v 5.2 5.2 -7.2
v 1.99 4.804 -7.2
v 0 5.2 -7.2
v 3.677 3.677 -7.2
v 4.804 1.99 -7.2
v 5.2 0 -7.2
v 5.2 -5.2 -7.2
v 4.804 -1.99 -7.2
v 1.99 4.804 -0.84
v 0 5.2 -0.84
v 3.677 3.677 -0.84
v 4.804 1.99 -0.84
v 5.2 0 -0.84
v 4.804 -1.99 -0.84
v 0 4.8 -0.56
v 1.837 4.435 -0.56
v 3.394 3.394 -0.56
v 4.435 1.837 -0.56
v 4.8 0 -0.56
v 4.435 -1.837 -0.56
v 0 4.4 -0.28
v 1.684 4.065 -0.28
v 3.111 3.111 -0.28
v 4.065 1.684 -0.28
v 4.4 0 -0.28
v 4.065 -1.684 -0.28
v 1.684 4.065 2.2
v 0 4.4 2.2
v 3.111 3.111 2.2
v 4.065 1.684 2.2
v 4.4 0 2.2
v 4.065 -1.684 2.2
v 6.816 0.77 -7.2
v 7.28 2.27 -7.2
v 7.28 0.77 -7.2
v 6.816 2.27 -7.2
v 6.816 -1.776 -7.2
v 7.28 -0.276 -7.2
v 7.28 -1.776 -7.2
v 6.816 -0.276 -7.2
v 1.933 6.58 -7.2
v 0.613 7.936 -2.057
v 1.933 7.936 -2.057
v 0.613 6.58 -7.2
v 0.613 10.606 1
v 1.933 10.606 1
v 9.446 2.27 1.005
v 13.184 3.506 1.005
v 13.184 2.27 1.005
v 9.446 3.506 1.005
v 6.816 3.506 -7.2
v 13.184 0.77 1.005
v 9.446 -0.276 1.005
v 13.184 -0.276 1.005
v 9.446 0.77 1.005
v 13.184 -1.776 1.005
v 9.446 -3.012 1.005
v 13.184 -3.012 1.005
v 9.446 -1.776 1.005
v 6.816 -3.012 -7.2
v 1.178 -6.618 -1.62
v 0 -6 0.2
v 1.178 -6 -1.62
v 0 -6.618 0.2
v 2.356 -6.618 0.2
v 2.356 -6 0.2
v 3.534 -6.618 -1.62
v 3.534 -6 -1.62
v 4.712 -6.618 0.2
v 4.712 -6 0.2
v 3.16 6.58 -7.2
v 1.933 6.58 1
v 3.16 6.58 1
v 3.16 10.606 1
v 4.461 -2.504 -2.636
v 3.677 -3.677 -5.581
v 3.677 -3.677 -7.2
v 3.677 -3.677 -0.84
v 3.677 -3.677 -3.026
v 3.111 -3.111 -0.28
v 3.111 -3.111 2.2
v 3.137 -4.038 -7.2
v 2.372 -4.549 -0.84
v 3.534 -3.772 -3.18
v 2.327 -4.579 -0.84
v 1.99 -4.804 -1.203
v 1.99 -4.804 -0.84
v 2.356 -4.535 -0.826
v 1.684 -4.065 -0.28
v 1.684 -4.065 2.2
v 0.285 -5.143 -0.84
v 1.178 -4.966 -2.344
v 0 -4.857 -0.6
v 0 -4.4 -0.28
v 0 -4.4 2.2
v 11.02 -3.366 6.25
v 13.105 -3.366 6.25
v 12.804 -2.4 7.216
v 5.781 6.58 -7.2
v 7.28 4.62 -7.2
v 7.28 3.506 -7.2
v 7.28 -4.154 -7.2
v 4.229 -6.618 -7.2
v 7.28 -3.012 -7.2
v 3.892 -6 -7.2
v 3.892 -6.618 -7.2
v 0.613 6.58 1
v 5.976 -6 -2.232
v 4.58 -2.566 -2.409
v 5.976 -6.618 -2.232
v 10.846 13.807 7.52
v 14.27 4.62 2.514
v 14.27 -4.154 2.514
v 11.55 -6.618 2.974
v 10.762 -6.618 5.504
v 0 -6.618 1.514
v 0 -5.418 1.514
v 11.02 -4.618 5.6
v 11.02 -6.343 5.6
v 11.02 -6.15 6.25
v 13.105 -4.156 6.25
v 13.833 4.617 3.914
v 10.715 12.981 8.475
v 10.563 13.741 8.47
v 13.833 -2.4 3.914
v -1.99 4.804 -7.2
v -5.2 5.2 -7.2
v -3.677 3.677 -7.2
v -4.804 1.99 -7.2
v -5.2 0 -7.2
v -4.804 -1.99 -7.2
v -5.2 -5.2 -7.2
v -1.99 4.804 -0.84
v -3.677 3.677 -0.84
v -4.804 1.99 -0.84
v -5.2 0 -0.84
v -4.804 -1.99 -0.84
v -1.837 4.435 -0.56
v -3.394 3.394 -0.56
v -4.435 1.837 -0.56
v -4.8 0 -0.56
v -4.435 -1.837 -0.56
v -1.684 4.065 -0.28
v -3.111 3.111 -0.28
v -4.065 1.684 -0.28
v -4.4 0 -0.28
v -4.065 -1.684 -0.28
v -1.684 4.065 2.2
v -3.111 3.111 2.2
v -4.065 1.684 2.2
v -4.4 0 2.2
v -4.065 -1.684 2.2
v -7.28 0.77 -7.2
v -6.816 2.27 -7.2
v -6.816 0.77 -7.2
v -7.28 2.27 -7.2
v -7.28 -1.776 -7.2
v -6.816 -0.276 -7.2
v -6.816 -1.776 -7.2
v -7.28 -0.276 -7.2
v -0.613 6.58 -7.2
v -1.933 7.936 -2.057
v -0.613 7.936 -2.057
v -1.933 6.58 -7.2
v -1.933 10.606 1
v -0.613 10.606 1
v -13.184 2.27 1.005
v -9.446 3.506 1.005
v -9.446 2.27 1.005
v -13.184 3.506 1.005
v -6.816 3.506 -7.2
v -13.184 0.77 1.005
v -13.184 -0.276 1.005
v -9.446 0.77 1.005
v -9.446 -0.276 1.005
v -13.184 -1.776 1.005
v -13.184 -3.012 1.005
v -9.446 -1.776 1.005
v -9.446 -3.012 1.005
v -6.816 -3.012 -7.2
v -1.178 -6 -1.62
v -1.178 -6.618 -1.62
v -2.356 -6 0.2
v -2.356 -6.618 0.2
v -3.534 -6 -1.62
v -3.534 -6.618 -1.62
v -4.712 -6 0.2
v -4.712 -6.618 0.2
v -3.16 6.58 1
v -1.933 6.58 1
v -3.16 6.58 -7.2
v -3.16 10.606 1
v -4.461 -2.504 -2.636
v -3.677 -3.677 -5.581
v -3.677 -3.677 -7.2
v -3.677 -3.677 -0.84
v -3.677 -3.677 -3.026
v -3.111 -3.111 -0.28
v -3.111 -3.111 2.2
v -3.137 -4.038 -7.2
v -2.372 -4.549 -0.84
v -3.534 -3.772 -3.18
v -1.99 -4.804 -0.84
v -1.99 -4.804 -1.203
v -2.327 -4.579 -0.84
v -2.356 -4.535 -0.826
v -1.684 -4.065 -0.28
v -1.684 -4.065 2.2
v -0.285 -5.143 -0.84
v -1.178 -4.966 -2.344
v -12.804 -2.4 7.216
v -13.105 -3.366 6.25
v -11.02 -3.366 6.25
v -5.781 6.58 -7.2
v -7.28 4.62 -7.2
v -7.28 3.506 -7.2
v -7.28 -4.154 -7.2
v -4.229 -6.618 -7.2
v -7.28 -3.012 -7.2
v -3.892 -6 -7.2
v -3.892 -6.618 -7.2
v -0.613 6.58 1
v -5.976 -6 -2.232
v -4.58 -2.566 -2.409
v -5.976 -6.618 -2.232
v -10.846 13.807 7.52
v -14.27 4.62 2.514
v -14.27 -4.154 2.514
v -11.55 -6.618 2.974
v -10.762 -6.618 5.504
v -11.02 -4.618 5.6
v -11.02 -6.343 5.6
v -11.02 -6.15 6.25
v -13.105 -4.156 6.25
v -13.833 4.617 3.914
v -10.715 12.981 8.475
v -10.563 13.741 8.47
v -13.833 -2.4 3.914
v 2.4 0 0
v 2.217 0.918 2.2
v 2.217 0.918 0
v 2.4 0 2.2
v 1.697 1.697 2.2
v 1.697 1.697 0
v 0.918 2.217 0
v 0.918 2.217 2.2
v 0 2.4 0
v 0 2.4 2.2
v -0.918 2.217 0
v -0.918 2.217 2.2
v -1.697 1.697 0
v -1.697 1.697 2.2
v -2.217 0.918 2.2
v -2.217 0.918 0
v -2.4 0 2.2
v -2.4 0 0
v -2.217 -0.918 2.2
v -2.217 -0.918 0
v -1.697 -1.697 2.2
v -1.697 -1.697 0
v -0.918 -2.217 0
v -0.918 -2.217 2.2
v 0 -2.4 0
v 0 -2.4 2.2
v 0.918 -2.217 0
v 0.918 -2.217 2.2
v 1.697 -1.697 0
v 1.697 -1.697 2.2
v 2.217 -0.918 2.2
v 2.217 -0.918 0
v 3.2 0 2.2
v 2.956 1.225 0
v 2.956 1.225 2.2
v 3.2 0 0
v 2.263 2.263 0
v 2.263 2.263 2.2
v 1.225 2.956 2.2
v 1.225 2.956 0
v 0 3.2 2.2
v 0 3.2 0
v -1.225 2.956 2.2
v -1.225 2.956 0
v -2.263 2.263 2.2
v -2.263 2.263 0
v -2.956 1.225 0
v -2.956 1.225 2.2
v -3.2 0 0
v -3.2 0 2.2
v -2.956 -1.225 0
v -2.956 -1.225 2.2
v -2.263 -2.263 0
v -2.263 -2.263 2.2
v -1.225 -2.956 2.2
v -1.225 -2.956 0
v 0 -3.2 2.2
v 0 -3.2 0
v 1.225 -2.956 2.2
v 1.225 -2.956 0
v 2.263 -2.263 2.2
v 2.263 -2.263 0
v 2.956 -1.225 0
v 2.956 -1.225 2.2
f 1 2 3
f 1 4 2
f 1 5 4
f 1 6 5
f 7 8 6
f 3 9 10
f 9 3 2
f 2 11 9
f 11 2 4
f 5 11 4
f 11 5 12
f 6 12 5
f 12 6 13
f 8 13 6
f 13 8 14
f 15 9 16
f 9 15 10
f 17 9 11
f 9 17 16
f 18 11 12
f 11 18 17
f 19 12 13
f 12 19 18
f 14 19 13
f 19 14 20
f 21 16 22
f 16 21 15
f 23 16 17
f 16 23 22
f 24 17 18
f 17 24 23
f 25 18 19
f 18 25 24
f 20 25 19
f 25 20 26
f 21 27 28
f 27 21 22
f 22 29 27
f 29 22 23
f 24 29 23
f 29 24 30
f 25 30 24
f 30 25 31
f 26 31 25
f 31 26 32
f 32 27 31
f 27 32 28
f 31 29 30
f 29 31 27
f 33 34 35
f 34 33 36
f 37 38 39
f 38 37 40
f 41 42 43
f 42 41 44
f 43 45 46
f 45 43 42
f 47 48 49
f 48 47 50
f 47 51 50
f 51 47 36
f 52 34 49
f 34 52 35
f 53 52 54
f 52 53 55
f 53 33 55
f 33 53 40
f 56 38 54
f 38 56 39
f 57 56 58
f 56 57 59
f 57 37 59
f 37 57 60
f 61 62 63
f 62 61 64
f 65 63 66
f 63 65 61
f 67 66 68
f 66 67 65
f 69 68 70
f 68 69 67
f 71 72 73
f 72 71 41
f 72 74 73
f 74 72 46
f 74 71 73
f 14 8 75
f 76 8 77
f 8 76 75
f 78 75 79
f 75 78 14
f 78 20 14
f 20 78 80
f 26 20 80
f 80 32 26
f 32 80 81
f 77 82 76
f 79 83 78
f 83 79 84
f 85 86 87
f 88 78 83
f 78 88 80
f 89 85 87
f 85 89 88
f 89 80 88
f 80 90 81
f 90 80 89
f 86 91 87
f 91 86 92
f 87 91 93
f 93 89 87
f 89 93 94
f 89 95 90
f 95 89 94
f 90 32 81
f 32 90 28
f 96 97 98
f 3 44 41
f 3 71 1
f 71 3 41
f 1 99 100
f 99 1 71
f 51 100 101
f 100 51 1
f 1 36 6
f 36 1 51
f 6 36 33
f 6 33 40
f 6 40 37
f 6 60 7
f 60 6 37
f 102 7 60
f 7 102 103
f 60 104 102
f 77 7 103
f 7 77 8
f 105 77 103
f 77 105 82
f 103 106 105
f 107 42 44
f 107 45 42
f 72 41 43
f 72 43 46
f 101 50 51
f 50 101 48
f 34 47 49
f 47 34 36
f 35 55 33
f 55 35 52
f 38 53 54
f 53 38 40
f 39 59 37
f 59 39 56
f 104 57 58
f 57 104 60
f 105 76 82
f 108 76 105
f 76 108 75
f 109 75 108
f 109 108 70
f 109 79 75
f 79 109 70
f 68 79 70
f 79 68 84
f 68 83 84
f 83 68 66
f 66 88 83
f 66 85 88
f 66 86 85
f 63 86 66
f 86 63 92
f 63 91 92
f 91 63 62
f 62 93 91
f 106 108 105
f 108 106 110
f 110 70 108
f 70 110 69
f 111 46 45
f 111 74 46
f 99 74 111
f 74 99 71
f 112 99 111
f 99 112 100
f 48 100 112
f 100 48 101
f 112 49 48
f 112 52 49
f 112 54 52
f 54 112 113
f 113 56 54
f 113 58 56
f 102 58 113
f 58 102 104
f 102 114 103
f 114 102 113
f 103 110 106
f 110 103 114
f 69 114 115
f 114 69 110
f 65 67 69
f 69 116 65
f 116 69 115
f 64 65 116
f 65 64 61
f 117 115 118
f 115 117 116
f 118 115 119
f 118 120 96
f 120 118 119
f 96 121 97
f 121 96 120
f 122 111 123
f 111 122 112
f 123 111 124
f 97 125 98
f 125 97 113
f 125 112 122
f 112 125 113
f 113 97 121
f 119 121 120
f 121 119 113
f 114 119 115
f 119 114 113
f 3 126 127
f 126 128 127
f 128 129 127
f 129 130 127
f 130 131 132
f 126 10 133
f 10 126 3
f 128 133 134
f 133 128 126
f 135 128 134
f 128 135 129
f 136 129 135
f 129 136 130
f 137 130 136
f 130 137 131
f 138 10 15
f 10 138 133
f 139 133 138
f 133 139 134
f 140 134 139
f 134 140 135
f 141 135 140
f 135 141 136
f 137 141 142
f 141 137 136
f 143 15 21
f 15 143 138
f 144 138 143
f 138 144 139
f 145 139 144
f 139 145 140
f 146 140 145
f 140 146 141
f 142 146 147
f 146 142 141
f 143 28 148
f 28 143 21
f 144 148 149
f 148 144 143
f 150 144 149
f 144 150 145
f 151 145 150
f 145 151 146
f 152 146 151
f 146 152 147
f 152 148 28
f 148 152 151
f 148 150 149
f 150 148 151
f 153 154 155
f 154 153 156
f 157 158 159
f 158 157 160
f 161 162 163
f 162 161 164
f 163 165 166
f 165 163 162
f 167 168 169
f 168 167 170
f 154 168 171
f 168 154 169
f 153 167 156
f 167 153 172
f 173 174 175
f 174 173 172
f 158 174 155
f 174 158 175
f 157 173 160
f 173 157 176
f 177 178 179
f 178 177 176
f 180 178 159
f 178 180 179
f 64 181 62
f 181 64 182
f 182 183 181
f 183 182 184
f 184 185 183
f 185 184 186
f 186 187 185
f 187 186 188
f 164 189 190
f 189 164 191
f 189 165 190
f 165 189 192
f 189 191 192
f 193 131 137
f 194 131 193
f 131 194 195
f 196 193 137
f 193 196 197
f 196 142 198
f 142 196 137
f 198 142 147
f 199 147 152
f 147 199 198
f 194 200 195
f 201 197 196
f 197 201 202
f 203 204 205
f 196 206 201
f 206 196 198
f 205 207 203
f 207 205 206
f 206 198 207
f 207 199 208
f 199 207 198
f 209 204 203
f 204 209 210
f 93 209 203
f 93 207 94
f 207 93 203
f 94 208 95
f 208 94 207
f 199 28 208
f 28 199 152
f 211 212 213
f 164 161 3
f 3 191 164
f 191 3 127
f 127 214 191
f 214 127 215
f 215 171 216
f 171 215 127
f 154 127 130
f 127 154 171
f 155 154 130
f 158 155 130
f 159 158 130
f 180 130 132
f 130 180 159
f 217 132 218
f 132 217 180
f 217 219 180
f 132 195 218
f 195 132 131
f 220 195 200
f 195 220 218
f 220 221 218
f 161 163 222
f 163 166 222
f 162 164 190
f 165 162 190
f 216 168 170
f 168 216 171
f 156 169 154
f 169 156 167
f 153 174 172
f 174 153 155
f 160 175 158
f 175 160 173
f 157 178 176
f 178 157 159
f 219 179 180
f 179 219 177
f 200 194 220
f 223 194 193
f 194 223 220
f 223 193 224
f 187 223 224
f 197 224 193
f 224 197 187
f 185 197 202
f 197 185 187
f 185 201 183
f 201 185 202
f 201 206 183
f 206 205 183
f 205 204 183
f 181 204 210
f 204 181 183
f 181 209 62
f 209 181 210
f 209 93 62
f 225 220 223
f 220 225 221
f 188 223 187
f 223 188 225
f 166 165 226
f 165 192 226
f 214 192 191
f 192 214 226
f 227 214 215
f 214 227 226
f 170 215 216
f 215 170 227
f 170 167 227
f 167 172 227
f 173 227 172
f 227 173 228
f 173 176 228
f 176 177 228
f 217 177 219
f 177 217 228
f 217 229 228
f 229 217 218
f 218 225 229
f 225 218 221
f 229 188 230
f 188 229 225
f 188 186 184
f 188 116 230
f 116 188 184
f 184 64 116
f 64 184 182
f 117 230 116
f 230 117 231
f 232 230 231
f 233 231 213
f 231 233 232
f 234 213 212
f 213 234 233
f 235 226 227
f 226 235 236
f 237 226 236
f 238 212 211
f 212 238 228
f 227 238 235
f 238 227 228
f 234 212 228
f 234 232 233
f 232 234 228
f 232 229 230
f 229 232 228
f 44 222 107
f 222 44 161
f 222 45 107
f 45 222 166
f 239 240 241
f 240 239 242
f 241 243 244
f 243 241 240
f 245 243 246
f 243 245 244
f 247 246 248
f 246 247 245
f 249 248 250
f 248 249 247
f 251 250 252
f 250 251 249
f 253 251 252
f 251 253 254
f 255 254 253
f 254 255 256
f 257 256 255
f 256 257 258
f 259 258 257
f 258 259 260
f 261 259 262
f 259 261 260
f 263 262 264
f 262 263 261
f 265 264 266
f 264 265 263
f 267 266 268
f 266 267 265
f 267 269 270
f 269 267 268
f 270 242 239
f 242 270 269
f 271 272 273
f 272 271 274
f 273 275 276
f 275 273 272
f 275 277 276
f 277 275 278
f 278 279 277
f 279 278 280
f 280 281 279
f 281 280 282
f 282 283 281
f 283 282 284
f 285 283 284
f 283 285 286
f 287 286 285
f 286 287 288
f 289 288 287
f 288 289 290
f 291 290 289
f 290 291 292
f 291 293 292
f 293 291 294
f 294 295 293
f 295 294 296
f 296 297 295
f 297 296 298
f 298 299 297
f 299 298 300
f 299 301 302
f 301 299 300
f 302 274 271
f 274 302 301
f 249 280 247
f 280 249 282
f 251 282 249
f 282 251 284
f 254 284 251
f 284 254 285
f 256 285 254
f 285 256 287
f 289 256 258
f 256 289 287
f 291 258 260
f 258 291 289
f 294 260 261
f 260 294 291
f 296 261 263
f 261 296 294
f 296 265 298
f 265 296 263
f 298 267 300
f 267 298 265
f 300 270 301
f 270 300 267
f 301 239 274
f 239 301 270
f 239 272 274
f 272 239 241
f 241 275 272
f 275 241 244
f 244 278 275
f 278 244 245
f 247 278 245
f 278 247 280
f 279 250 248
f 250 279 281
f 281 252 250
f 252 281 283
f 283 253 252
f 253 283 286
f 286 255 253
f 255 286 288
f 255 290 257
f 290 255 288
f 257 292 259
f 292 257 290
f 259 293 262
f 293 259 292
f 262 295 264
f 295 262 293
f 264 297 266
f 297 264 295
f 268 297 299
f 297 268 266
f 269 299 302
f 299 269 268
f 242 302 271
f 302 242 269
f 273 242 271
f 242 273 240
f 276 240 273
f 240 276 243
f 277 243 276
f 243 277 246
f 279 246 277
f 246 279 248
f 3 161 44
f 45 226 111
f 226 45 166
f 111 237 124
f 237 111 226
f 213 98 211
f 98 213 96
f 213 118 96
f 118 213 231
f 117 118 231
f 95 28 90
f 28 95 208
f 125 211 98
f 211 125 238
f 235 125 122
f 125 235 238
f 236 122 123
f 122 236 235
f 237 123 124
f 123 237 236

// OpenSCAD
use <../lib.scad>
use <../p/box2-5.scad>
use <s/16095s01.scad>
use <../p/stud4.scad>
function ldraw_lib__16095() = [
// 0 ~Minifig Helmet Large Square - Bottom
// 0 Name: 16095.dat
// 0 Author: Massimo Maso [Sirio]
// 0 !LDRAW_ORG Part UPDATE 2024-03
// 0 !LICENSE Licensed under CC BY 4.0 : see CAreadme.txt
// 
// 0 BFC CERTIFY CCW
  [0,"BFC","CERTIFY"],
  [0,"BFC","CCW"],
// 
// 0 !CATEGORY Minifig Headwear
// 
// 0 !HISTORY 2023-12-08 [MagFors] Split into two parts
// 0 !HISTORY 2024-04-28 [OrionP] Official Update 2024-03
// 
// 0 // Subparts
// 1 16 0 0 0 1 0 0 0 1 0 0 0 1 s\16095s01.dat
  [1,16,0,0,0,1,0,0,0,1,0,0,0,1, ldraw_lib__s__16095s01()],
// 1 16 0 0 0 -1 0 0 0 1 0 0 0 1 s\16095s01.dat
  [1,16,0,0,0,-1,0,0,0,1,0,0,0,1, ldraw_lib__s__16095s01()],
// 0 // Primitives
// 0 BFC INVERTNEXT
  [0,"BFC","INVERTNEXT"],
// 1 16 0 7.75 21.48225 1.5335 0 0 0 0 -10.25 0 -5.03225 0 box2-5.dat
  [1,16,0,7.75,21.48225,1.5335,0,0,0,0,-10.25,0,-5.03225,0, ldraw_lib__box2_5()],
// 1 16 0 -5.5 0 1 0 0 0 -1.375 0 0 0 1 stud4.dat
  [1,16,0,-5.5,0,1,0,0,0,-1.375,0,0,0,1, ldraw_lib__stud4()],
// 0 // Faces
// 3 16 0 18 13 -1.5335 18 16.45 1.5335 18 16.45
  [3,16,0,18,13,-1.5335,18,16.45,1.5335,18,16.45],
// 4 16 -27.116 -18.8 34.517 27.116 -18.8 34.517 1.5335 -2.5 26.5145 -1.5335 -2.5 26.5145
  [4,16,-27.116,-18.8,34.517,27.116,-18.8,34.517,1.5335,-2.5,26.5145,-1.5335,-2.5,26.5145],
// 4 16 27.116 -18.8 34.517 -27.116 -18.8 34.517 -26.4076 -21.175 34.3532 26.4076 -21.175 34.3532
  [4,16,27.116,-18.8,34.517,-27.116,-18.8,34.517,-26.4076,-21.175,34.3532,26.4076,-21.175,34.3532],
// 4 16 -32.0096 -18.04 -6 -27.55 -15.625 -8.415 27.55 -15.625 -8.415 32.0096 -18.04 -6
  [4,16,-32.0096,-18.04,-6,-27.55,-15.625,-8.415,27.55,-15.625,-8.415,32.0096,-18.04,-6],
// 4 16 -27.55 -14 -11.545 27.55 -14 -11.545 27.55 -15.625 -8.415 -27.55 -15.625 -8.415
  [4,16,-27.55,-14,-11.545,27.55,-14,-11.545,27.55,-15.625,-8.415,-27.55,-15.625,-8.415],
// 3 16 0 -3.785 -13.545 27.55 -14 -11.545 -27.55 -14 -11.545
  [3,16,0,-3.785,-13.545,27.55,-14,-11.545,-27.55,-14,-11.545],
// 4 16 0 -5.5 11 4.2097 -5.5 -10.1629 0 -5.5 -11 -4.2097 -5.5 -10.1629
  [4,16,0,-5.5,11,4.2097,-5.5,-10.1629,0,-5.5,-11,-4.2097,-5.5,-10.1629],
// 0 // Edges
// 2 24 0 1.5003 -12.1433 0 -.5 -15
  [2,24,0,1.5003,-12.1433,0,-.5,-15],
// 2 24 0 -.5 -15 0 -.5 -16.545
  [2,24,0,-.5,-15,0,-.5,-16.545],
// 2 24 -27.116 -18.8 34.517 27.116 -18.8 34.517
  [2,24,-27.116,-18.8,34.517,27.116,-18.8,34.517],
// 2 24 -32.0096 -18.04 -6 32.0096 -18.04 -6
  [2,24,-32.0096,-18.04,-6,32.0096,-18.04,-6],
// 2 24 -27.55 -15.625 -8.415 27.55 -15.625 -8.415
  [2,24,-27.55,-15.625,-8.415,27.55,-15.625,-8.415],
// 2 24 -27.55 -14 -11.545 27.55 -14 -11.545
  [2,24,-27.55,-14,-11.545,27.55,-14,-11.545],
// 2 24 -32.0096 -18.04 -6 -34.5836 -9.785 -6
  [2,24,-32.0096,-18.04,-6,-34.5836,-9.785,-6],
// 2 24 -34.5836 -9.785 -6 -34.5836 -9.785 11.5429
  [2,24,-34.5836,-9.785,-6,-34.5836,-9.785,11.5429],
// 2 24 -34.5836 -9.785 11.5429 -26.7885 -21.1873 32.4533
  [2,24,-34.5836,-9.785,11.5429,-26.7885,-21.1873,32.4533],
// 2 24 -26.7885 -21.1873 32.4533 -26.4076 -21.175 34.3532
  [2,24,-26.7885,-21.1873,32.4533,-26.4076,-21.175,34.3532],
// 2 24 -26.4076 -21.175 34.3532 26.4076 -21.175 34.3532
  [2,24,-26.4076,-21.175,34.3532,26.4076,-21.175,34.3532],
// 2 24 26.4076 -21.175 34.3532 26.7885 -21.1873 32.4533
  [2,24,26.4076,-21.175,34.3532,26.7885,-21.1873,32.4533],
// 2 24 26.7885 -21.1873 32.4533 34.5836 -9.785 11.5429
  [2,24,26.7885,-21.1873,32.4533,34.5836,-9.785,11.5429],
// 2 24 34.5836 -9.785 11.5429 34.5836 -9.785 -6
  [2,24,34.5836,-9.785,11.5429,34.5836,-9.785,-6],
// 2 24 34.5836 -9.785 -6 32.0096 -18.04 -6
  [2,24,34.5836,-9.785,-6,32.0096,-18.04,-6],
// 
// 0 // closed inside
// 4 16 -34.5836 -9.785 -6 -32.0096 -18.04 -6 32.0096 -18.04 -6 34.5836 -9.785 -6
  [4,16,-34.5836,-9.785,-6,-32.0096,-18.04,-6,32.0096,-18.04,-6,34.5836,-9.785,-6],
// 4 16 -34.5836 -9.785 11.5429 -34.5836 -9.785 -6 34.5836 -9.785 -6 34.5836 -9.785 11.5429
  [4,16,-34.5836,-9.785,11.5429,-34.5836,-9.785,-6,34.5836,-9.785,-6,34.5836,-9.785,11.5429],
// 4 16 -34.5836 -9.785 11.5429 34.5836 -9.785 11.5429 26.7885 -21.1873 32.4533 -26.7885 -21.1873 32.4533
  [4,16,-34.5836,-9.785,11.5429,34.5836,-9.785,11.5429,26.7885,-21.1873,32.4533,-26.7885,-21.1873,32.4533],
// 4 16 -26.4076 -21.175 34.3532 -26.7885 -21.1873 32.4533 26.7885 -21.1873 32.4533 26.4076 -21.175 34.3532
  [4,16,-26.4076,-21.175,34.3532,-26.7885,-21.1873,32.4533,26.7885,-21.1873,32.4533,26.4076,-21.175,34.3532],
// 2 24 -34.5836 -9.785 -6 34.5836 -9.785 -6
  [2,24,-34.5836,-9.785,-6,34.5836,-9.785,-6],
// 2 24 -34.5836 -9.785 11.5429 34.5836 -9.785 11.5429
  [2,24,-34.5836,-9.785,11.5429,34.5836,-9.785,11.5429],
// 2 24 -26.7885 -21.1873 32.4533 26.7885 -21.1873 32.4533
  [2,24,-26.7885,-21.1873,32.4533,26.7885,-21.1873,32.4533],
];
module ldraw_lib__16095(step=0, col=false, unit=2/5, alt=false, line=0.2, solid=!$preview)
    makepoly(ldraw_lib__16095(), step=step, col=col, unit=unit, alt=alt, line=line, solid=solid);
ldraw_lib__16095(line=0.2);
